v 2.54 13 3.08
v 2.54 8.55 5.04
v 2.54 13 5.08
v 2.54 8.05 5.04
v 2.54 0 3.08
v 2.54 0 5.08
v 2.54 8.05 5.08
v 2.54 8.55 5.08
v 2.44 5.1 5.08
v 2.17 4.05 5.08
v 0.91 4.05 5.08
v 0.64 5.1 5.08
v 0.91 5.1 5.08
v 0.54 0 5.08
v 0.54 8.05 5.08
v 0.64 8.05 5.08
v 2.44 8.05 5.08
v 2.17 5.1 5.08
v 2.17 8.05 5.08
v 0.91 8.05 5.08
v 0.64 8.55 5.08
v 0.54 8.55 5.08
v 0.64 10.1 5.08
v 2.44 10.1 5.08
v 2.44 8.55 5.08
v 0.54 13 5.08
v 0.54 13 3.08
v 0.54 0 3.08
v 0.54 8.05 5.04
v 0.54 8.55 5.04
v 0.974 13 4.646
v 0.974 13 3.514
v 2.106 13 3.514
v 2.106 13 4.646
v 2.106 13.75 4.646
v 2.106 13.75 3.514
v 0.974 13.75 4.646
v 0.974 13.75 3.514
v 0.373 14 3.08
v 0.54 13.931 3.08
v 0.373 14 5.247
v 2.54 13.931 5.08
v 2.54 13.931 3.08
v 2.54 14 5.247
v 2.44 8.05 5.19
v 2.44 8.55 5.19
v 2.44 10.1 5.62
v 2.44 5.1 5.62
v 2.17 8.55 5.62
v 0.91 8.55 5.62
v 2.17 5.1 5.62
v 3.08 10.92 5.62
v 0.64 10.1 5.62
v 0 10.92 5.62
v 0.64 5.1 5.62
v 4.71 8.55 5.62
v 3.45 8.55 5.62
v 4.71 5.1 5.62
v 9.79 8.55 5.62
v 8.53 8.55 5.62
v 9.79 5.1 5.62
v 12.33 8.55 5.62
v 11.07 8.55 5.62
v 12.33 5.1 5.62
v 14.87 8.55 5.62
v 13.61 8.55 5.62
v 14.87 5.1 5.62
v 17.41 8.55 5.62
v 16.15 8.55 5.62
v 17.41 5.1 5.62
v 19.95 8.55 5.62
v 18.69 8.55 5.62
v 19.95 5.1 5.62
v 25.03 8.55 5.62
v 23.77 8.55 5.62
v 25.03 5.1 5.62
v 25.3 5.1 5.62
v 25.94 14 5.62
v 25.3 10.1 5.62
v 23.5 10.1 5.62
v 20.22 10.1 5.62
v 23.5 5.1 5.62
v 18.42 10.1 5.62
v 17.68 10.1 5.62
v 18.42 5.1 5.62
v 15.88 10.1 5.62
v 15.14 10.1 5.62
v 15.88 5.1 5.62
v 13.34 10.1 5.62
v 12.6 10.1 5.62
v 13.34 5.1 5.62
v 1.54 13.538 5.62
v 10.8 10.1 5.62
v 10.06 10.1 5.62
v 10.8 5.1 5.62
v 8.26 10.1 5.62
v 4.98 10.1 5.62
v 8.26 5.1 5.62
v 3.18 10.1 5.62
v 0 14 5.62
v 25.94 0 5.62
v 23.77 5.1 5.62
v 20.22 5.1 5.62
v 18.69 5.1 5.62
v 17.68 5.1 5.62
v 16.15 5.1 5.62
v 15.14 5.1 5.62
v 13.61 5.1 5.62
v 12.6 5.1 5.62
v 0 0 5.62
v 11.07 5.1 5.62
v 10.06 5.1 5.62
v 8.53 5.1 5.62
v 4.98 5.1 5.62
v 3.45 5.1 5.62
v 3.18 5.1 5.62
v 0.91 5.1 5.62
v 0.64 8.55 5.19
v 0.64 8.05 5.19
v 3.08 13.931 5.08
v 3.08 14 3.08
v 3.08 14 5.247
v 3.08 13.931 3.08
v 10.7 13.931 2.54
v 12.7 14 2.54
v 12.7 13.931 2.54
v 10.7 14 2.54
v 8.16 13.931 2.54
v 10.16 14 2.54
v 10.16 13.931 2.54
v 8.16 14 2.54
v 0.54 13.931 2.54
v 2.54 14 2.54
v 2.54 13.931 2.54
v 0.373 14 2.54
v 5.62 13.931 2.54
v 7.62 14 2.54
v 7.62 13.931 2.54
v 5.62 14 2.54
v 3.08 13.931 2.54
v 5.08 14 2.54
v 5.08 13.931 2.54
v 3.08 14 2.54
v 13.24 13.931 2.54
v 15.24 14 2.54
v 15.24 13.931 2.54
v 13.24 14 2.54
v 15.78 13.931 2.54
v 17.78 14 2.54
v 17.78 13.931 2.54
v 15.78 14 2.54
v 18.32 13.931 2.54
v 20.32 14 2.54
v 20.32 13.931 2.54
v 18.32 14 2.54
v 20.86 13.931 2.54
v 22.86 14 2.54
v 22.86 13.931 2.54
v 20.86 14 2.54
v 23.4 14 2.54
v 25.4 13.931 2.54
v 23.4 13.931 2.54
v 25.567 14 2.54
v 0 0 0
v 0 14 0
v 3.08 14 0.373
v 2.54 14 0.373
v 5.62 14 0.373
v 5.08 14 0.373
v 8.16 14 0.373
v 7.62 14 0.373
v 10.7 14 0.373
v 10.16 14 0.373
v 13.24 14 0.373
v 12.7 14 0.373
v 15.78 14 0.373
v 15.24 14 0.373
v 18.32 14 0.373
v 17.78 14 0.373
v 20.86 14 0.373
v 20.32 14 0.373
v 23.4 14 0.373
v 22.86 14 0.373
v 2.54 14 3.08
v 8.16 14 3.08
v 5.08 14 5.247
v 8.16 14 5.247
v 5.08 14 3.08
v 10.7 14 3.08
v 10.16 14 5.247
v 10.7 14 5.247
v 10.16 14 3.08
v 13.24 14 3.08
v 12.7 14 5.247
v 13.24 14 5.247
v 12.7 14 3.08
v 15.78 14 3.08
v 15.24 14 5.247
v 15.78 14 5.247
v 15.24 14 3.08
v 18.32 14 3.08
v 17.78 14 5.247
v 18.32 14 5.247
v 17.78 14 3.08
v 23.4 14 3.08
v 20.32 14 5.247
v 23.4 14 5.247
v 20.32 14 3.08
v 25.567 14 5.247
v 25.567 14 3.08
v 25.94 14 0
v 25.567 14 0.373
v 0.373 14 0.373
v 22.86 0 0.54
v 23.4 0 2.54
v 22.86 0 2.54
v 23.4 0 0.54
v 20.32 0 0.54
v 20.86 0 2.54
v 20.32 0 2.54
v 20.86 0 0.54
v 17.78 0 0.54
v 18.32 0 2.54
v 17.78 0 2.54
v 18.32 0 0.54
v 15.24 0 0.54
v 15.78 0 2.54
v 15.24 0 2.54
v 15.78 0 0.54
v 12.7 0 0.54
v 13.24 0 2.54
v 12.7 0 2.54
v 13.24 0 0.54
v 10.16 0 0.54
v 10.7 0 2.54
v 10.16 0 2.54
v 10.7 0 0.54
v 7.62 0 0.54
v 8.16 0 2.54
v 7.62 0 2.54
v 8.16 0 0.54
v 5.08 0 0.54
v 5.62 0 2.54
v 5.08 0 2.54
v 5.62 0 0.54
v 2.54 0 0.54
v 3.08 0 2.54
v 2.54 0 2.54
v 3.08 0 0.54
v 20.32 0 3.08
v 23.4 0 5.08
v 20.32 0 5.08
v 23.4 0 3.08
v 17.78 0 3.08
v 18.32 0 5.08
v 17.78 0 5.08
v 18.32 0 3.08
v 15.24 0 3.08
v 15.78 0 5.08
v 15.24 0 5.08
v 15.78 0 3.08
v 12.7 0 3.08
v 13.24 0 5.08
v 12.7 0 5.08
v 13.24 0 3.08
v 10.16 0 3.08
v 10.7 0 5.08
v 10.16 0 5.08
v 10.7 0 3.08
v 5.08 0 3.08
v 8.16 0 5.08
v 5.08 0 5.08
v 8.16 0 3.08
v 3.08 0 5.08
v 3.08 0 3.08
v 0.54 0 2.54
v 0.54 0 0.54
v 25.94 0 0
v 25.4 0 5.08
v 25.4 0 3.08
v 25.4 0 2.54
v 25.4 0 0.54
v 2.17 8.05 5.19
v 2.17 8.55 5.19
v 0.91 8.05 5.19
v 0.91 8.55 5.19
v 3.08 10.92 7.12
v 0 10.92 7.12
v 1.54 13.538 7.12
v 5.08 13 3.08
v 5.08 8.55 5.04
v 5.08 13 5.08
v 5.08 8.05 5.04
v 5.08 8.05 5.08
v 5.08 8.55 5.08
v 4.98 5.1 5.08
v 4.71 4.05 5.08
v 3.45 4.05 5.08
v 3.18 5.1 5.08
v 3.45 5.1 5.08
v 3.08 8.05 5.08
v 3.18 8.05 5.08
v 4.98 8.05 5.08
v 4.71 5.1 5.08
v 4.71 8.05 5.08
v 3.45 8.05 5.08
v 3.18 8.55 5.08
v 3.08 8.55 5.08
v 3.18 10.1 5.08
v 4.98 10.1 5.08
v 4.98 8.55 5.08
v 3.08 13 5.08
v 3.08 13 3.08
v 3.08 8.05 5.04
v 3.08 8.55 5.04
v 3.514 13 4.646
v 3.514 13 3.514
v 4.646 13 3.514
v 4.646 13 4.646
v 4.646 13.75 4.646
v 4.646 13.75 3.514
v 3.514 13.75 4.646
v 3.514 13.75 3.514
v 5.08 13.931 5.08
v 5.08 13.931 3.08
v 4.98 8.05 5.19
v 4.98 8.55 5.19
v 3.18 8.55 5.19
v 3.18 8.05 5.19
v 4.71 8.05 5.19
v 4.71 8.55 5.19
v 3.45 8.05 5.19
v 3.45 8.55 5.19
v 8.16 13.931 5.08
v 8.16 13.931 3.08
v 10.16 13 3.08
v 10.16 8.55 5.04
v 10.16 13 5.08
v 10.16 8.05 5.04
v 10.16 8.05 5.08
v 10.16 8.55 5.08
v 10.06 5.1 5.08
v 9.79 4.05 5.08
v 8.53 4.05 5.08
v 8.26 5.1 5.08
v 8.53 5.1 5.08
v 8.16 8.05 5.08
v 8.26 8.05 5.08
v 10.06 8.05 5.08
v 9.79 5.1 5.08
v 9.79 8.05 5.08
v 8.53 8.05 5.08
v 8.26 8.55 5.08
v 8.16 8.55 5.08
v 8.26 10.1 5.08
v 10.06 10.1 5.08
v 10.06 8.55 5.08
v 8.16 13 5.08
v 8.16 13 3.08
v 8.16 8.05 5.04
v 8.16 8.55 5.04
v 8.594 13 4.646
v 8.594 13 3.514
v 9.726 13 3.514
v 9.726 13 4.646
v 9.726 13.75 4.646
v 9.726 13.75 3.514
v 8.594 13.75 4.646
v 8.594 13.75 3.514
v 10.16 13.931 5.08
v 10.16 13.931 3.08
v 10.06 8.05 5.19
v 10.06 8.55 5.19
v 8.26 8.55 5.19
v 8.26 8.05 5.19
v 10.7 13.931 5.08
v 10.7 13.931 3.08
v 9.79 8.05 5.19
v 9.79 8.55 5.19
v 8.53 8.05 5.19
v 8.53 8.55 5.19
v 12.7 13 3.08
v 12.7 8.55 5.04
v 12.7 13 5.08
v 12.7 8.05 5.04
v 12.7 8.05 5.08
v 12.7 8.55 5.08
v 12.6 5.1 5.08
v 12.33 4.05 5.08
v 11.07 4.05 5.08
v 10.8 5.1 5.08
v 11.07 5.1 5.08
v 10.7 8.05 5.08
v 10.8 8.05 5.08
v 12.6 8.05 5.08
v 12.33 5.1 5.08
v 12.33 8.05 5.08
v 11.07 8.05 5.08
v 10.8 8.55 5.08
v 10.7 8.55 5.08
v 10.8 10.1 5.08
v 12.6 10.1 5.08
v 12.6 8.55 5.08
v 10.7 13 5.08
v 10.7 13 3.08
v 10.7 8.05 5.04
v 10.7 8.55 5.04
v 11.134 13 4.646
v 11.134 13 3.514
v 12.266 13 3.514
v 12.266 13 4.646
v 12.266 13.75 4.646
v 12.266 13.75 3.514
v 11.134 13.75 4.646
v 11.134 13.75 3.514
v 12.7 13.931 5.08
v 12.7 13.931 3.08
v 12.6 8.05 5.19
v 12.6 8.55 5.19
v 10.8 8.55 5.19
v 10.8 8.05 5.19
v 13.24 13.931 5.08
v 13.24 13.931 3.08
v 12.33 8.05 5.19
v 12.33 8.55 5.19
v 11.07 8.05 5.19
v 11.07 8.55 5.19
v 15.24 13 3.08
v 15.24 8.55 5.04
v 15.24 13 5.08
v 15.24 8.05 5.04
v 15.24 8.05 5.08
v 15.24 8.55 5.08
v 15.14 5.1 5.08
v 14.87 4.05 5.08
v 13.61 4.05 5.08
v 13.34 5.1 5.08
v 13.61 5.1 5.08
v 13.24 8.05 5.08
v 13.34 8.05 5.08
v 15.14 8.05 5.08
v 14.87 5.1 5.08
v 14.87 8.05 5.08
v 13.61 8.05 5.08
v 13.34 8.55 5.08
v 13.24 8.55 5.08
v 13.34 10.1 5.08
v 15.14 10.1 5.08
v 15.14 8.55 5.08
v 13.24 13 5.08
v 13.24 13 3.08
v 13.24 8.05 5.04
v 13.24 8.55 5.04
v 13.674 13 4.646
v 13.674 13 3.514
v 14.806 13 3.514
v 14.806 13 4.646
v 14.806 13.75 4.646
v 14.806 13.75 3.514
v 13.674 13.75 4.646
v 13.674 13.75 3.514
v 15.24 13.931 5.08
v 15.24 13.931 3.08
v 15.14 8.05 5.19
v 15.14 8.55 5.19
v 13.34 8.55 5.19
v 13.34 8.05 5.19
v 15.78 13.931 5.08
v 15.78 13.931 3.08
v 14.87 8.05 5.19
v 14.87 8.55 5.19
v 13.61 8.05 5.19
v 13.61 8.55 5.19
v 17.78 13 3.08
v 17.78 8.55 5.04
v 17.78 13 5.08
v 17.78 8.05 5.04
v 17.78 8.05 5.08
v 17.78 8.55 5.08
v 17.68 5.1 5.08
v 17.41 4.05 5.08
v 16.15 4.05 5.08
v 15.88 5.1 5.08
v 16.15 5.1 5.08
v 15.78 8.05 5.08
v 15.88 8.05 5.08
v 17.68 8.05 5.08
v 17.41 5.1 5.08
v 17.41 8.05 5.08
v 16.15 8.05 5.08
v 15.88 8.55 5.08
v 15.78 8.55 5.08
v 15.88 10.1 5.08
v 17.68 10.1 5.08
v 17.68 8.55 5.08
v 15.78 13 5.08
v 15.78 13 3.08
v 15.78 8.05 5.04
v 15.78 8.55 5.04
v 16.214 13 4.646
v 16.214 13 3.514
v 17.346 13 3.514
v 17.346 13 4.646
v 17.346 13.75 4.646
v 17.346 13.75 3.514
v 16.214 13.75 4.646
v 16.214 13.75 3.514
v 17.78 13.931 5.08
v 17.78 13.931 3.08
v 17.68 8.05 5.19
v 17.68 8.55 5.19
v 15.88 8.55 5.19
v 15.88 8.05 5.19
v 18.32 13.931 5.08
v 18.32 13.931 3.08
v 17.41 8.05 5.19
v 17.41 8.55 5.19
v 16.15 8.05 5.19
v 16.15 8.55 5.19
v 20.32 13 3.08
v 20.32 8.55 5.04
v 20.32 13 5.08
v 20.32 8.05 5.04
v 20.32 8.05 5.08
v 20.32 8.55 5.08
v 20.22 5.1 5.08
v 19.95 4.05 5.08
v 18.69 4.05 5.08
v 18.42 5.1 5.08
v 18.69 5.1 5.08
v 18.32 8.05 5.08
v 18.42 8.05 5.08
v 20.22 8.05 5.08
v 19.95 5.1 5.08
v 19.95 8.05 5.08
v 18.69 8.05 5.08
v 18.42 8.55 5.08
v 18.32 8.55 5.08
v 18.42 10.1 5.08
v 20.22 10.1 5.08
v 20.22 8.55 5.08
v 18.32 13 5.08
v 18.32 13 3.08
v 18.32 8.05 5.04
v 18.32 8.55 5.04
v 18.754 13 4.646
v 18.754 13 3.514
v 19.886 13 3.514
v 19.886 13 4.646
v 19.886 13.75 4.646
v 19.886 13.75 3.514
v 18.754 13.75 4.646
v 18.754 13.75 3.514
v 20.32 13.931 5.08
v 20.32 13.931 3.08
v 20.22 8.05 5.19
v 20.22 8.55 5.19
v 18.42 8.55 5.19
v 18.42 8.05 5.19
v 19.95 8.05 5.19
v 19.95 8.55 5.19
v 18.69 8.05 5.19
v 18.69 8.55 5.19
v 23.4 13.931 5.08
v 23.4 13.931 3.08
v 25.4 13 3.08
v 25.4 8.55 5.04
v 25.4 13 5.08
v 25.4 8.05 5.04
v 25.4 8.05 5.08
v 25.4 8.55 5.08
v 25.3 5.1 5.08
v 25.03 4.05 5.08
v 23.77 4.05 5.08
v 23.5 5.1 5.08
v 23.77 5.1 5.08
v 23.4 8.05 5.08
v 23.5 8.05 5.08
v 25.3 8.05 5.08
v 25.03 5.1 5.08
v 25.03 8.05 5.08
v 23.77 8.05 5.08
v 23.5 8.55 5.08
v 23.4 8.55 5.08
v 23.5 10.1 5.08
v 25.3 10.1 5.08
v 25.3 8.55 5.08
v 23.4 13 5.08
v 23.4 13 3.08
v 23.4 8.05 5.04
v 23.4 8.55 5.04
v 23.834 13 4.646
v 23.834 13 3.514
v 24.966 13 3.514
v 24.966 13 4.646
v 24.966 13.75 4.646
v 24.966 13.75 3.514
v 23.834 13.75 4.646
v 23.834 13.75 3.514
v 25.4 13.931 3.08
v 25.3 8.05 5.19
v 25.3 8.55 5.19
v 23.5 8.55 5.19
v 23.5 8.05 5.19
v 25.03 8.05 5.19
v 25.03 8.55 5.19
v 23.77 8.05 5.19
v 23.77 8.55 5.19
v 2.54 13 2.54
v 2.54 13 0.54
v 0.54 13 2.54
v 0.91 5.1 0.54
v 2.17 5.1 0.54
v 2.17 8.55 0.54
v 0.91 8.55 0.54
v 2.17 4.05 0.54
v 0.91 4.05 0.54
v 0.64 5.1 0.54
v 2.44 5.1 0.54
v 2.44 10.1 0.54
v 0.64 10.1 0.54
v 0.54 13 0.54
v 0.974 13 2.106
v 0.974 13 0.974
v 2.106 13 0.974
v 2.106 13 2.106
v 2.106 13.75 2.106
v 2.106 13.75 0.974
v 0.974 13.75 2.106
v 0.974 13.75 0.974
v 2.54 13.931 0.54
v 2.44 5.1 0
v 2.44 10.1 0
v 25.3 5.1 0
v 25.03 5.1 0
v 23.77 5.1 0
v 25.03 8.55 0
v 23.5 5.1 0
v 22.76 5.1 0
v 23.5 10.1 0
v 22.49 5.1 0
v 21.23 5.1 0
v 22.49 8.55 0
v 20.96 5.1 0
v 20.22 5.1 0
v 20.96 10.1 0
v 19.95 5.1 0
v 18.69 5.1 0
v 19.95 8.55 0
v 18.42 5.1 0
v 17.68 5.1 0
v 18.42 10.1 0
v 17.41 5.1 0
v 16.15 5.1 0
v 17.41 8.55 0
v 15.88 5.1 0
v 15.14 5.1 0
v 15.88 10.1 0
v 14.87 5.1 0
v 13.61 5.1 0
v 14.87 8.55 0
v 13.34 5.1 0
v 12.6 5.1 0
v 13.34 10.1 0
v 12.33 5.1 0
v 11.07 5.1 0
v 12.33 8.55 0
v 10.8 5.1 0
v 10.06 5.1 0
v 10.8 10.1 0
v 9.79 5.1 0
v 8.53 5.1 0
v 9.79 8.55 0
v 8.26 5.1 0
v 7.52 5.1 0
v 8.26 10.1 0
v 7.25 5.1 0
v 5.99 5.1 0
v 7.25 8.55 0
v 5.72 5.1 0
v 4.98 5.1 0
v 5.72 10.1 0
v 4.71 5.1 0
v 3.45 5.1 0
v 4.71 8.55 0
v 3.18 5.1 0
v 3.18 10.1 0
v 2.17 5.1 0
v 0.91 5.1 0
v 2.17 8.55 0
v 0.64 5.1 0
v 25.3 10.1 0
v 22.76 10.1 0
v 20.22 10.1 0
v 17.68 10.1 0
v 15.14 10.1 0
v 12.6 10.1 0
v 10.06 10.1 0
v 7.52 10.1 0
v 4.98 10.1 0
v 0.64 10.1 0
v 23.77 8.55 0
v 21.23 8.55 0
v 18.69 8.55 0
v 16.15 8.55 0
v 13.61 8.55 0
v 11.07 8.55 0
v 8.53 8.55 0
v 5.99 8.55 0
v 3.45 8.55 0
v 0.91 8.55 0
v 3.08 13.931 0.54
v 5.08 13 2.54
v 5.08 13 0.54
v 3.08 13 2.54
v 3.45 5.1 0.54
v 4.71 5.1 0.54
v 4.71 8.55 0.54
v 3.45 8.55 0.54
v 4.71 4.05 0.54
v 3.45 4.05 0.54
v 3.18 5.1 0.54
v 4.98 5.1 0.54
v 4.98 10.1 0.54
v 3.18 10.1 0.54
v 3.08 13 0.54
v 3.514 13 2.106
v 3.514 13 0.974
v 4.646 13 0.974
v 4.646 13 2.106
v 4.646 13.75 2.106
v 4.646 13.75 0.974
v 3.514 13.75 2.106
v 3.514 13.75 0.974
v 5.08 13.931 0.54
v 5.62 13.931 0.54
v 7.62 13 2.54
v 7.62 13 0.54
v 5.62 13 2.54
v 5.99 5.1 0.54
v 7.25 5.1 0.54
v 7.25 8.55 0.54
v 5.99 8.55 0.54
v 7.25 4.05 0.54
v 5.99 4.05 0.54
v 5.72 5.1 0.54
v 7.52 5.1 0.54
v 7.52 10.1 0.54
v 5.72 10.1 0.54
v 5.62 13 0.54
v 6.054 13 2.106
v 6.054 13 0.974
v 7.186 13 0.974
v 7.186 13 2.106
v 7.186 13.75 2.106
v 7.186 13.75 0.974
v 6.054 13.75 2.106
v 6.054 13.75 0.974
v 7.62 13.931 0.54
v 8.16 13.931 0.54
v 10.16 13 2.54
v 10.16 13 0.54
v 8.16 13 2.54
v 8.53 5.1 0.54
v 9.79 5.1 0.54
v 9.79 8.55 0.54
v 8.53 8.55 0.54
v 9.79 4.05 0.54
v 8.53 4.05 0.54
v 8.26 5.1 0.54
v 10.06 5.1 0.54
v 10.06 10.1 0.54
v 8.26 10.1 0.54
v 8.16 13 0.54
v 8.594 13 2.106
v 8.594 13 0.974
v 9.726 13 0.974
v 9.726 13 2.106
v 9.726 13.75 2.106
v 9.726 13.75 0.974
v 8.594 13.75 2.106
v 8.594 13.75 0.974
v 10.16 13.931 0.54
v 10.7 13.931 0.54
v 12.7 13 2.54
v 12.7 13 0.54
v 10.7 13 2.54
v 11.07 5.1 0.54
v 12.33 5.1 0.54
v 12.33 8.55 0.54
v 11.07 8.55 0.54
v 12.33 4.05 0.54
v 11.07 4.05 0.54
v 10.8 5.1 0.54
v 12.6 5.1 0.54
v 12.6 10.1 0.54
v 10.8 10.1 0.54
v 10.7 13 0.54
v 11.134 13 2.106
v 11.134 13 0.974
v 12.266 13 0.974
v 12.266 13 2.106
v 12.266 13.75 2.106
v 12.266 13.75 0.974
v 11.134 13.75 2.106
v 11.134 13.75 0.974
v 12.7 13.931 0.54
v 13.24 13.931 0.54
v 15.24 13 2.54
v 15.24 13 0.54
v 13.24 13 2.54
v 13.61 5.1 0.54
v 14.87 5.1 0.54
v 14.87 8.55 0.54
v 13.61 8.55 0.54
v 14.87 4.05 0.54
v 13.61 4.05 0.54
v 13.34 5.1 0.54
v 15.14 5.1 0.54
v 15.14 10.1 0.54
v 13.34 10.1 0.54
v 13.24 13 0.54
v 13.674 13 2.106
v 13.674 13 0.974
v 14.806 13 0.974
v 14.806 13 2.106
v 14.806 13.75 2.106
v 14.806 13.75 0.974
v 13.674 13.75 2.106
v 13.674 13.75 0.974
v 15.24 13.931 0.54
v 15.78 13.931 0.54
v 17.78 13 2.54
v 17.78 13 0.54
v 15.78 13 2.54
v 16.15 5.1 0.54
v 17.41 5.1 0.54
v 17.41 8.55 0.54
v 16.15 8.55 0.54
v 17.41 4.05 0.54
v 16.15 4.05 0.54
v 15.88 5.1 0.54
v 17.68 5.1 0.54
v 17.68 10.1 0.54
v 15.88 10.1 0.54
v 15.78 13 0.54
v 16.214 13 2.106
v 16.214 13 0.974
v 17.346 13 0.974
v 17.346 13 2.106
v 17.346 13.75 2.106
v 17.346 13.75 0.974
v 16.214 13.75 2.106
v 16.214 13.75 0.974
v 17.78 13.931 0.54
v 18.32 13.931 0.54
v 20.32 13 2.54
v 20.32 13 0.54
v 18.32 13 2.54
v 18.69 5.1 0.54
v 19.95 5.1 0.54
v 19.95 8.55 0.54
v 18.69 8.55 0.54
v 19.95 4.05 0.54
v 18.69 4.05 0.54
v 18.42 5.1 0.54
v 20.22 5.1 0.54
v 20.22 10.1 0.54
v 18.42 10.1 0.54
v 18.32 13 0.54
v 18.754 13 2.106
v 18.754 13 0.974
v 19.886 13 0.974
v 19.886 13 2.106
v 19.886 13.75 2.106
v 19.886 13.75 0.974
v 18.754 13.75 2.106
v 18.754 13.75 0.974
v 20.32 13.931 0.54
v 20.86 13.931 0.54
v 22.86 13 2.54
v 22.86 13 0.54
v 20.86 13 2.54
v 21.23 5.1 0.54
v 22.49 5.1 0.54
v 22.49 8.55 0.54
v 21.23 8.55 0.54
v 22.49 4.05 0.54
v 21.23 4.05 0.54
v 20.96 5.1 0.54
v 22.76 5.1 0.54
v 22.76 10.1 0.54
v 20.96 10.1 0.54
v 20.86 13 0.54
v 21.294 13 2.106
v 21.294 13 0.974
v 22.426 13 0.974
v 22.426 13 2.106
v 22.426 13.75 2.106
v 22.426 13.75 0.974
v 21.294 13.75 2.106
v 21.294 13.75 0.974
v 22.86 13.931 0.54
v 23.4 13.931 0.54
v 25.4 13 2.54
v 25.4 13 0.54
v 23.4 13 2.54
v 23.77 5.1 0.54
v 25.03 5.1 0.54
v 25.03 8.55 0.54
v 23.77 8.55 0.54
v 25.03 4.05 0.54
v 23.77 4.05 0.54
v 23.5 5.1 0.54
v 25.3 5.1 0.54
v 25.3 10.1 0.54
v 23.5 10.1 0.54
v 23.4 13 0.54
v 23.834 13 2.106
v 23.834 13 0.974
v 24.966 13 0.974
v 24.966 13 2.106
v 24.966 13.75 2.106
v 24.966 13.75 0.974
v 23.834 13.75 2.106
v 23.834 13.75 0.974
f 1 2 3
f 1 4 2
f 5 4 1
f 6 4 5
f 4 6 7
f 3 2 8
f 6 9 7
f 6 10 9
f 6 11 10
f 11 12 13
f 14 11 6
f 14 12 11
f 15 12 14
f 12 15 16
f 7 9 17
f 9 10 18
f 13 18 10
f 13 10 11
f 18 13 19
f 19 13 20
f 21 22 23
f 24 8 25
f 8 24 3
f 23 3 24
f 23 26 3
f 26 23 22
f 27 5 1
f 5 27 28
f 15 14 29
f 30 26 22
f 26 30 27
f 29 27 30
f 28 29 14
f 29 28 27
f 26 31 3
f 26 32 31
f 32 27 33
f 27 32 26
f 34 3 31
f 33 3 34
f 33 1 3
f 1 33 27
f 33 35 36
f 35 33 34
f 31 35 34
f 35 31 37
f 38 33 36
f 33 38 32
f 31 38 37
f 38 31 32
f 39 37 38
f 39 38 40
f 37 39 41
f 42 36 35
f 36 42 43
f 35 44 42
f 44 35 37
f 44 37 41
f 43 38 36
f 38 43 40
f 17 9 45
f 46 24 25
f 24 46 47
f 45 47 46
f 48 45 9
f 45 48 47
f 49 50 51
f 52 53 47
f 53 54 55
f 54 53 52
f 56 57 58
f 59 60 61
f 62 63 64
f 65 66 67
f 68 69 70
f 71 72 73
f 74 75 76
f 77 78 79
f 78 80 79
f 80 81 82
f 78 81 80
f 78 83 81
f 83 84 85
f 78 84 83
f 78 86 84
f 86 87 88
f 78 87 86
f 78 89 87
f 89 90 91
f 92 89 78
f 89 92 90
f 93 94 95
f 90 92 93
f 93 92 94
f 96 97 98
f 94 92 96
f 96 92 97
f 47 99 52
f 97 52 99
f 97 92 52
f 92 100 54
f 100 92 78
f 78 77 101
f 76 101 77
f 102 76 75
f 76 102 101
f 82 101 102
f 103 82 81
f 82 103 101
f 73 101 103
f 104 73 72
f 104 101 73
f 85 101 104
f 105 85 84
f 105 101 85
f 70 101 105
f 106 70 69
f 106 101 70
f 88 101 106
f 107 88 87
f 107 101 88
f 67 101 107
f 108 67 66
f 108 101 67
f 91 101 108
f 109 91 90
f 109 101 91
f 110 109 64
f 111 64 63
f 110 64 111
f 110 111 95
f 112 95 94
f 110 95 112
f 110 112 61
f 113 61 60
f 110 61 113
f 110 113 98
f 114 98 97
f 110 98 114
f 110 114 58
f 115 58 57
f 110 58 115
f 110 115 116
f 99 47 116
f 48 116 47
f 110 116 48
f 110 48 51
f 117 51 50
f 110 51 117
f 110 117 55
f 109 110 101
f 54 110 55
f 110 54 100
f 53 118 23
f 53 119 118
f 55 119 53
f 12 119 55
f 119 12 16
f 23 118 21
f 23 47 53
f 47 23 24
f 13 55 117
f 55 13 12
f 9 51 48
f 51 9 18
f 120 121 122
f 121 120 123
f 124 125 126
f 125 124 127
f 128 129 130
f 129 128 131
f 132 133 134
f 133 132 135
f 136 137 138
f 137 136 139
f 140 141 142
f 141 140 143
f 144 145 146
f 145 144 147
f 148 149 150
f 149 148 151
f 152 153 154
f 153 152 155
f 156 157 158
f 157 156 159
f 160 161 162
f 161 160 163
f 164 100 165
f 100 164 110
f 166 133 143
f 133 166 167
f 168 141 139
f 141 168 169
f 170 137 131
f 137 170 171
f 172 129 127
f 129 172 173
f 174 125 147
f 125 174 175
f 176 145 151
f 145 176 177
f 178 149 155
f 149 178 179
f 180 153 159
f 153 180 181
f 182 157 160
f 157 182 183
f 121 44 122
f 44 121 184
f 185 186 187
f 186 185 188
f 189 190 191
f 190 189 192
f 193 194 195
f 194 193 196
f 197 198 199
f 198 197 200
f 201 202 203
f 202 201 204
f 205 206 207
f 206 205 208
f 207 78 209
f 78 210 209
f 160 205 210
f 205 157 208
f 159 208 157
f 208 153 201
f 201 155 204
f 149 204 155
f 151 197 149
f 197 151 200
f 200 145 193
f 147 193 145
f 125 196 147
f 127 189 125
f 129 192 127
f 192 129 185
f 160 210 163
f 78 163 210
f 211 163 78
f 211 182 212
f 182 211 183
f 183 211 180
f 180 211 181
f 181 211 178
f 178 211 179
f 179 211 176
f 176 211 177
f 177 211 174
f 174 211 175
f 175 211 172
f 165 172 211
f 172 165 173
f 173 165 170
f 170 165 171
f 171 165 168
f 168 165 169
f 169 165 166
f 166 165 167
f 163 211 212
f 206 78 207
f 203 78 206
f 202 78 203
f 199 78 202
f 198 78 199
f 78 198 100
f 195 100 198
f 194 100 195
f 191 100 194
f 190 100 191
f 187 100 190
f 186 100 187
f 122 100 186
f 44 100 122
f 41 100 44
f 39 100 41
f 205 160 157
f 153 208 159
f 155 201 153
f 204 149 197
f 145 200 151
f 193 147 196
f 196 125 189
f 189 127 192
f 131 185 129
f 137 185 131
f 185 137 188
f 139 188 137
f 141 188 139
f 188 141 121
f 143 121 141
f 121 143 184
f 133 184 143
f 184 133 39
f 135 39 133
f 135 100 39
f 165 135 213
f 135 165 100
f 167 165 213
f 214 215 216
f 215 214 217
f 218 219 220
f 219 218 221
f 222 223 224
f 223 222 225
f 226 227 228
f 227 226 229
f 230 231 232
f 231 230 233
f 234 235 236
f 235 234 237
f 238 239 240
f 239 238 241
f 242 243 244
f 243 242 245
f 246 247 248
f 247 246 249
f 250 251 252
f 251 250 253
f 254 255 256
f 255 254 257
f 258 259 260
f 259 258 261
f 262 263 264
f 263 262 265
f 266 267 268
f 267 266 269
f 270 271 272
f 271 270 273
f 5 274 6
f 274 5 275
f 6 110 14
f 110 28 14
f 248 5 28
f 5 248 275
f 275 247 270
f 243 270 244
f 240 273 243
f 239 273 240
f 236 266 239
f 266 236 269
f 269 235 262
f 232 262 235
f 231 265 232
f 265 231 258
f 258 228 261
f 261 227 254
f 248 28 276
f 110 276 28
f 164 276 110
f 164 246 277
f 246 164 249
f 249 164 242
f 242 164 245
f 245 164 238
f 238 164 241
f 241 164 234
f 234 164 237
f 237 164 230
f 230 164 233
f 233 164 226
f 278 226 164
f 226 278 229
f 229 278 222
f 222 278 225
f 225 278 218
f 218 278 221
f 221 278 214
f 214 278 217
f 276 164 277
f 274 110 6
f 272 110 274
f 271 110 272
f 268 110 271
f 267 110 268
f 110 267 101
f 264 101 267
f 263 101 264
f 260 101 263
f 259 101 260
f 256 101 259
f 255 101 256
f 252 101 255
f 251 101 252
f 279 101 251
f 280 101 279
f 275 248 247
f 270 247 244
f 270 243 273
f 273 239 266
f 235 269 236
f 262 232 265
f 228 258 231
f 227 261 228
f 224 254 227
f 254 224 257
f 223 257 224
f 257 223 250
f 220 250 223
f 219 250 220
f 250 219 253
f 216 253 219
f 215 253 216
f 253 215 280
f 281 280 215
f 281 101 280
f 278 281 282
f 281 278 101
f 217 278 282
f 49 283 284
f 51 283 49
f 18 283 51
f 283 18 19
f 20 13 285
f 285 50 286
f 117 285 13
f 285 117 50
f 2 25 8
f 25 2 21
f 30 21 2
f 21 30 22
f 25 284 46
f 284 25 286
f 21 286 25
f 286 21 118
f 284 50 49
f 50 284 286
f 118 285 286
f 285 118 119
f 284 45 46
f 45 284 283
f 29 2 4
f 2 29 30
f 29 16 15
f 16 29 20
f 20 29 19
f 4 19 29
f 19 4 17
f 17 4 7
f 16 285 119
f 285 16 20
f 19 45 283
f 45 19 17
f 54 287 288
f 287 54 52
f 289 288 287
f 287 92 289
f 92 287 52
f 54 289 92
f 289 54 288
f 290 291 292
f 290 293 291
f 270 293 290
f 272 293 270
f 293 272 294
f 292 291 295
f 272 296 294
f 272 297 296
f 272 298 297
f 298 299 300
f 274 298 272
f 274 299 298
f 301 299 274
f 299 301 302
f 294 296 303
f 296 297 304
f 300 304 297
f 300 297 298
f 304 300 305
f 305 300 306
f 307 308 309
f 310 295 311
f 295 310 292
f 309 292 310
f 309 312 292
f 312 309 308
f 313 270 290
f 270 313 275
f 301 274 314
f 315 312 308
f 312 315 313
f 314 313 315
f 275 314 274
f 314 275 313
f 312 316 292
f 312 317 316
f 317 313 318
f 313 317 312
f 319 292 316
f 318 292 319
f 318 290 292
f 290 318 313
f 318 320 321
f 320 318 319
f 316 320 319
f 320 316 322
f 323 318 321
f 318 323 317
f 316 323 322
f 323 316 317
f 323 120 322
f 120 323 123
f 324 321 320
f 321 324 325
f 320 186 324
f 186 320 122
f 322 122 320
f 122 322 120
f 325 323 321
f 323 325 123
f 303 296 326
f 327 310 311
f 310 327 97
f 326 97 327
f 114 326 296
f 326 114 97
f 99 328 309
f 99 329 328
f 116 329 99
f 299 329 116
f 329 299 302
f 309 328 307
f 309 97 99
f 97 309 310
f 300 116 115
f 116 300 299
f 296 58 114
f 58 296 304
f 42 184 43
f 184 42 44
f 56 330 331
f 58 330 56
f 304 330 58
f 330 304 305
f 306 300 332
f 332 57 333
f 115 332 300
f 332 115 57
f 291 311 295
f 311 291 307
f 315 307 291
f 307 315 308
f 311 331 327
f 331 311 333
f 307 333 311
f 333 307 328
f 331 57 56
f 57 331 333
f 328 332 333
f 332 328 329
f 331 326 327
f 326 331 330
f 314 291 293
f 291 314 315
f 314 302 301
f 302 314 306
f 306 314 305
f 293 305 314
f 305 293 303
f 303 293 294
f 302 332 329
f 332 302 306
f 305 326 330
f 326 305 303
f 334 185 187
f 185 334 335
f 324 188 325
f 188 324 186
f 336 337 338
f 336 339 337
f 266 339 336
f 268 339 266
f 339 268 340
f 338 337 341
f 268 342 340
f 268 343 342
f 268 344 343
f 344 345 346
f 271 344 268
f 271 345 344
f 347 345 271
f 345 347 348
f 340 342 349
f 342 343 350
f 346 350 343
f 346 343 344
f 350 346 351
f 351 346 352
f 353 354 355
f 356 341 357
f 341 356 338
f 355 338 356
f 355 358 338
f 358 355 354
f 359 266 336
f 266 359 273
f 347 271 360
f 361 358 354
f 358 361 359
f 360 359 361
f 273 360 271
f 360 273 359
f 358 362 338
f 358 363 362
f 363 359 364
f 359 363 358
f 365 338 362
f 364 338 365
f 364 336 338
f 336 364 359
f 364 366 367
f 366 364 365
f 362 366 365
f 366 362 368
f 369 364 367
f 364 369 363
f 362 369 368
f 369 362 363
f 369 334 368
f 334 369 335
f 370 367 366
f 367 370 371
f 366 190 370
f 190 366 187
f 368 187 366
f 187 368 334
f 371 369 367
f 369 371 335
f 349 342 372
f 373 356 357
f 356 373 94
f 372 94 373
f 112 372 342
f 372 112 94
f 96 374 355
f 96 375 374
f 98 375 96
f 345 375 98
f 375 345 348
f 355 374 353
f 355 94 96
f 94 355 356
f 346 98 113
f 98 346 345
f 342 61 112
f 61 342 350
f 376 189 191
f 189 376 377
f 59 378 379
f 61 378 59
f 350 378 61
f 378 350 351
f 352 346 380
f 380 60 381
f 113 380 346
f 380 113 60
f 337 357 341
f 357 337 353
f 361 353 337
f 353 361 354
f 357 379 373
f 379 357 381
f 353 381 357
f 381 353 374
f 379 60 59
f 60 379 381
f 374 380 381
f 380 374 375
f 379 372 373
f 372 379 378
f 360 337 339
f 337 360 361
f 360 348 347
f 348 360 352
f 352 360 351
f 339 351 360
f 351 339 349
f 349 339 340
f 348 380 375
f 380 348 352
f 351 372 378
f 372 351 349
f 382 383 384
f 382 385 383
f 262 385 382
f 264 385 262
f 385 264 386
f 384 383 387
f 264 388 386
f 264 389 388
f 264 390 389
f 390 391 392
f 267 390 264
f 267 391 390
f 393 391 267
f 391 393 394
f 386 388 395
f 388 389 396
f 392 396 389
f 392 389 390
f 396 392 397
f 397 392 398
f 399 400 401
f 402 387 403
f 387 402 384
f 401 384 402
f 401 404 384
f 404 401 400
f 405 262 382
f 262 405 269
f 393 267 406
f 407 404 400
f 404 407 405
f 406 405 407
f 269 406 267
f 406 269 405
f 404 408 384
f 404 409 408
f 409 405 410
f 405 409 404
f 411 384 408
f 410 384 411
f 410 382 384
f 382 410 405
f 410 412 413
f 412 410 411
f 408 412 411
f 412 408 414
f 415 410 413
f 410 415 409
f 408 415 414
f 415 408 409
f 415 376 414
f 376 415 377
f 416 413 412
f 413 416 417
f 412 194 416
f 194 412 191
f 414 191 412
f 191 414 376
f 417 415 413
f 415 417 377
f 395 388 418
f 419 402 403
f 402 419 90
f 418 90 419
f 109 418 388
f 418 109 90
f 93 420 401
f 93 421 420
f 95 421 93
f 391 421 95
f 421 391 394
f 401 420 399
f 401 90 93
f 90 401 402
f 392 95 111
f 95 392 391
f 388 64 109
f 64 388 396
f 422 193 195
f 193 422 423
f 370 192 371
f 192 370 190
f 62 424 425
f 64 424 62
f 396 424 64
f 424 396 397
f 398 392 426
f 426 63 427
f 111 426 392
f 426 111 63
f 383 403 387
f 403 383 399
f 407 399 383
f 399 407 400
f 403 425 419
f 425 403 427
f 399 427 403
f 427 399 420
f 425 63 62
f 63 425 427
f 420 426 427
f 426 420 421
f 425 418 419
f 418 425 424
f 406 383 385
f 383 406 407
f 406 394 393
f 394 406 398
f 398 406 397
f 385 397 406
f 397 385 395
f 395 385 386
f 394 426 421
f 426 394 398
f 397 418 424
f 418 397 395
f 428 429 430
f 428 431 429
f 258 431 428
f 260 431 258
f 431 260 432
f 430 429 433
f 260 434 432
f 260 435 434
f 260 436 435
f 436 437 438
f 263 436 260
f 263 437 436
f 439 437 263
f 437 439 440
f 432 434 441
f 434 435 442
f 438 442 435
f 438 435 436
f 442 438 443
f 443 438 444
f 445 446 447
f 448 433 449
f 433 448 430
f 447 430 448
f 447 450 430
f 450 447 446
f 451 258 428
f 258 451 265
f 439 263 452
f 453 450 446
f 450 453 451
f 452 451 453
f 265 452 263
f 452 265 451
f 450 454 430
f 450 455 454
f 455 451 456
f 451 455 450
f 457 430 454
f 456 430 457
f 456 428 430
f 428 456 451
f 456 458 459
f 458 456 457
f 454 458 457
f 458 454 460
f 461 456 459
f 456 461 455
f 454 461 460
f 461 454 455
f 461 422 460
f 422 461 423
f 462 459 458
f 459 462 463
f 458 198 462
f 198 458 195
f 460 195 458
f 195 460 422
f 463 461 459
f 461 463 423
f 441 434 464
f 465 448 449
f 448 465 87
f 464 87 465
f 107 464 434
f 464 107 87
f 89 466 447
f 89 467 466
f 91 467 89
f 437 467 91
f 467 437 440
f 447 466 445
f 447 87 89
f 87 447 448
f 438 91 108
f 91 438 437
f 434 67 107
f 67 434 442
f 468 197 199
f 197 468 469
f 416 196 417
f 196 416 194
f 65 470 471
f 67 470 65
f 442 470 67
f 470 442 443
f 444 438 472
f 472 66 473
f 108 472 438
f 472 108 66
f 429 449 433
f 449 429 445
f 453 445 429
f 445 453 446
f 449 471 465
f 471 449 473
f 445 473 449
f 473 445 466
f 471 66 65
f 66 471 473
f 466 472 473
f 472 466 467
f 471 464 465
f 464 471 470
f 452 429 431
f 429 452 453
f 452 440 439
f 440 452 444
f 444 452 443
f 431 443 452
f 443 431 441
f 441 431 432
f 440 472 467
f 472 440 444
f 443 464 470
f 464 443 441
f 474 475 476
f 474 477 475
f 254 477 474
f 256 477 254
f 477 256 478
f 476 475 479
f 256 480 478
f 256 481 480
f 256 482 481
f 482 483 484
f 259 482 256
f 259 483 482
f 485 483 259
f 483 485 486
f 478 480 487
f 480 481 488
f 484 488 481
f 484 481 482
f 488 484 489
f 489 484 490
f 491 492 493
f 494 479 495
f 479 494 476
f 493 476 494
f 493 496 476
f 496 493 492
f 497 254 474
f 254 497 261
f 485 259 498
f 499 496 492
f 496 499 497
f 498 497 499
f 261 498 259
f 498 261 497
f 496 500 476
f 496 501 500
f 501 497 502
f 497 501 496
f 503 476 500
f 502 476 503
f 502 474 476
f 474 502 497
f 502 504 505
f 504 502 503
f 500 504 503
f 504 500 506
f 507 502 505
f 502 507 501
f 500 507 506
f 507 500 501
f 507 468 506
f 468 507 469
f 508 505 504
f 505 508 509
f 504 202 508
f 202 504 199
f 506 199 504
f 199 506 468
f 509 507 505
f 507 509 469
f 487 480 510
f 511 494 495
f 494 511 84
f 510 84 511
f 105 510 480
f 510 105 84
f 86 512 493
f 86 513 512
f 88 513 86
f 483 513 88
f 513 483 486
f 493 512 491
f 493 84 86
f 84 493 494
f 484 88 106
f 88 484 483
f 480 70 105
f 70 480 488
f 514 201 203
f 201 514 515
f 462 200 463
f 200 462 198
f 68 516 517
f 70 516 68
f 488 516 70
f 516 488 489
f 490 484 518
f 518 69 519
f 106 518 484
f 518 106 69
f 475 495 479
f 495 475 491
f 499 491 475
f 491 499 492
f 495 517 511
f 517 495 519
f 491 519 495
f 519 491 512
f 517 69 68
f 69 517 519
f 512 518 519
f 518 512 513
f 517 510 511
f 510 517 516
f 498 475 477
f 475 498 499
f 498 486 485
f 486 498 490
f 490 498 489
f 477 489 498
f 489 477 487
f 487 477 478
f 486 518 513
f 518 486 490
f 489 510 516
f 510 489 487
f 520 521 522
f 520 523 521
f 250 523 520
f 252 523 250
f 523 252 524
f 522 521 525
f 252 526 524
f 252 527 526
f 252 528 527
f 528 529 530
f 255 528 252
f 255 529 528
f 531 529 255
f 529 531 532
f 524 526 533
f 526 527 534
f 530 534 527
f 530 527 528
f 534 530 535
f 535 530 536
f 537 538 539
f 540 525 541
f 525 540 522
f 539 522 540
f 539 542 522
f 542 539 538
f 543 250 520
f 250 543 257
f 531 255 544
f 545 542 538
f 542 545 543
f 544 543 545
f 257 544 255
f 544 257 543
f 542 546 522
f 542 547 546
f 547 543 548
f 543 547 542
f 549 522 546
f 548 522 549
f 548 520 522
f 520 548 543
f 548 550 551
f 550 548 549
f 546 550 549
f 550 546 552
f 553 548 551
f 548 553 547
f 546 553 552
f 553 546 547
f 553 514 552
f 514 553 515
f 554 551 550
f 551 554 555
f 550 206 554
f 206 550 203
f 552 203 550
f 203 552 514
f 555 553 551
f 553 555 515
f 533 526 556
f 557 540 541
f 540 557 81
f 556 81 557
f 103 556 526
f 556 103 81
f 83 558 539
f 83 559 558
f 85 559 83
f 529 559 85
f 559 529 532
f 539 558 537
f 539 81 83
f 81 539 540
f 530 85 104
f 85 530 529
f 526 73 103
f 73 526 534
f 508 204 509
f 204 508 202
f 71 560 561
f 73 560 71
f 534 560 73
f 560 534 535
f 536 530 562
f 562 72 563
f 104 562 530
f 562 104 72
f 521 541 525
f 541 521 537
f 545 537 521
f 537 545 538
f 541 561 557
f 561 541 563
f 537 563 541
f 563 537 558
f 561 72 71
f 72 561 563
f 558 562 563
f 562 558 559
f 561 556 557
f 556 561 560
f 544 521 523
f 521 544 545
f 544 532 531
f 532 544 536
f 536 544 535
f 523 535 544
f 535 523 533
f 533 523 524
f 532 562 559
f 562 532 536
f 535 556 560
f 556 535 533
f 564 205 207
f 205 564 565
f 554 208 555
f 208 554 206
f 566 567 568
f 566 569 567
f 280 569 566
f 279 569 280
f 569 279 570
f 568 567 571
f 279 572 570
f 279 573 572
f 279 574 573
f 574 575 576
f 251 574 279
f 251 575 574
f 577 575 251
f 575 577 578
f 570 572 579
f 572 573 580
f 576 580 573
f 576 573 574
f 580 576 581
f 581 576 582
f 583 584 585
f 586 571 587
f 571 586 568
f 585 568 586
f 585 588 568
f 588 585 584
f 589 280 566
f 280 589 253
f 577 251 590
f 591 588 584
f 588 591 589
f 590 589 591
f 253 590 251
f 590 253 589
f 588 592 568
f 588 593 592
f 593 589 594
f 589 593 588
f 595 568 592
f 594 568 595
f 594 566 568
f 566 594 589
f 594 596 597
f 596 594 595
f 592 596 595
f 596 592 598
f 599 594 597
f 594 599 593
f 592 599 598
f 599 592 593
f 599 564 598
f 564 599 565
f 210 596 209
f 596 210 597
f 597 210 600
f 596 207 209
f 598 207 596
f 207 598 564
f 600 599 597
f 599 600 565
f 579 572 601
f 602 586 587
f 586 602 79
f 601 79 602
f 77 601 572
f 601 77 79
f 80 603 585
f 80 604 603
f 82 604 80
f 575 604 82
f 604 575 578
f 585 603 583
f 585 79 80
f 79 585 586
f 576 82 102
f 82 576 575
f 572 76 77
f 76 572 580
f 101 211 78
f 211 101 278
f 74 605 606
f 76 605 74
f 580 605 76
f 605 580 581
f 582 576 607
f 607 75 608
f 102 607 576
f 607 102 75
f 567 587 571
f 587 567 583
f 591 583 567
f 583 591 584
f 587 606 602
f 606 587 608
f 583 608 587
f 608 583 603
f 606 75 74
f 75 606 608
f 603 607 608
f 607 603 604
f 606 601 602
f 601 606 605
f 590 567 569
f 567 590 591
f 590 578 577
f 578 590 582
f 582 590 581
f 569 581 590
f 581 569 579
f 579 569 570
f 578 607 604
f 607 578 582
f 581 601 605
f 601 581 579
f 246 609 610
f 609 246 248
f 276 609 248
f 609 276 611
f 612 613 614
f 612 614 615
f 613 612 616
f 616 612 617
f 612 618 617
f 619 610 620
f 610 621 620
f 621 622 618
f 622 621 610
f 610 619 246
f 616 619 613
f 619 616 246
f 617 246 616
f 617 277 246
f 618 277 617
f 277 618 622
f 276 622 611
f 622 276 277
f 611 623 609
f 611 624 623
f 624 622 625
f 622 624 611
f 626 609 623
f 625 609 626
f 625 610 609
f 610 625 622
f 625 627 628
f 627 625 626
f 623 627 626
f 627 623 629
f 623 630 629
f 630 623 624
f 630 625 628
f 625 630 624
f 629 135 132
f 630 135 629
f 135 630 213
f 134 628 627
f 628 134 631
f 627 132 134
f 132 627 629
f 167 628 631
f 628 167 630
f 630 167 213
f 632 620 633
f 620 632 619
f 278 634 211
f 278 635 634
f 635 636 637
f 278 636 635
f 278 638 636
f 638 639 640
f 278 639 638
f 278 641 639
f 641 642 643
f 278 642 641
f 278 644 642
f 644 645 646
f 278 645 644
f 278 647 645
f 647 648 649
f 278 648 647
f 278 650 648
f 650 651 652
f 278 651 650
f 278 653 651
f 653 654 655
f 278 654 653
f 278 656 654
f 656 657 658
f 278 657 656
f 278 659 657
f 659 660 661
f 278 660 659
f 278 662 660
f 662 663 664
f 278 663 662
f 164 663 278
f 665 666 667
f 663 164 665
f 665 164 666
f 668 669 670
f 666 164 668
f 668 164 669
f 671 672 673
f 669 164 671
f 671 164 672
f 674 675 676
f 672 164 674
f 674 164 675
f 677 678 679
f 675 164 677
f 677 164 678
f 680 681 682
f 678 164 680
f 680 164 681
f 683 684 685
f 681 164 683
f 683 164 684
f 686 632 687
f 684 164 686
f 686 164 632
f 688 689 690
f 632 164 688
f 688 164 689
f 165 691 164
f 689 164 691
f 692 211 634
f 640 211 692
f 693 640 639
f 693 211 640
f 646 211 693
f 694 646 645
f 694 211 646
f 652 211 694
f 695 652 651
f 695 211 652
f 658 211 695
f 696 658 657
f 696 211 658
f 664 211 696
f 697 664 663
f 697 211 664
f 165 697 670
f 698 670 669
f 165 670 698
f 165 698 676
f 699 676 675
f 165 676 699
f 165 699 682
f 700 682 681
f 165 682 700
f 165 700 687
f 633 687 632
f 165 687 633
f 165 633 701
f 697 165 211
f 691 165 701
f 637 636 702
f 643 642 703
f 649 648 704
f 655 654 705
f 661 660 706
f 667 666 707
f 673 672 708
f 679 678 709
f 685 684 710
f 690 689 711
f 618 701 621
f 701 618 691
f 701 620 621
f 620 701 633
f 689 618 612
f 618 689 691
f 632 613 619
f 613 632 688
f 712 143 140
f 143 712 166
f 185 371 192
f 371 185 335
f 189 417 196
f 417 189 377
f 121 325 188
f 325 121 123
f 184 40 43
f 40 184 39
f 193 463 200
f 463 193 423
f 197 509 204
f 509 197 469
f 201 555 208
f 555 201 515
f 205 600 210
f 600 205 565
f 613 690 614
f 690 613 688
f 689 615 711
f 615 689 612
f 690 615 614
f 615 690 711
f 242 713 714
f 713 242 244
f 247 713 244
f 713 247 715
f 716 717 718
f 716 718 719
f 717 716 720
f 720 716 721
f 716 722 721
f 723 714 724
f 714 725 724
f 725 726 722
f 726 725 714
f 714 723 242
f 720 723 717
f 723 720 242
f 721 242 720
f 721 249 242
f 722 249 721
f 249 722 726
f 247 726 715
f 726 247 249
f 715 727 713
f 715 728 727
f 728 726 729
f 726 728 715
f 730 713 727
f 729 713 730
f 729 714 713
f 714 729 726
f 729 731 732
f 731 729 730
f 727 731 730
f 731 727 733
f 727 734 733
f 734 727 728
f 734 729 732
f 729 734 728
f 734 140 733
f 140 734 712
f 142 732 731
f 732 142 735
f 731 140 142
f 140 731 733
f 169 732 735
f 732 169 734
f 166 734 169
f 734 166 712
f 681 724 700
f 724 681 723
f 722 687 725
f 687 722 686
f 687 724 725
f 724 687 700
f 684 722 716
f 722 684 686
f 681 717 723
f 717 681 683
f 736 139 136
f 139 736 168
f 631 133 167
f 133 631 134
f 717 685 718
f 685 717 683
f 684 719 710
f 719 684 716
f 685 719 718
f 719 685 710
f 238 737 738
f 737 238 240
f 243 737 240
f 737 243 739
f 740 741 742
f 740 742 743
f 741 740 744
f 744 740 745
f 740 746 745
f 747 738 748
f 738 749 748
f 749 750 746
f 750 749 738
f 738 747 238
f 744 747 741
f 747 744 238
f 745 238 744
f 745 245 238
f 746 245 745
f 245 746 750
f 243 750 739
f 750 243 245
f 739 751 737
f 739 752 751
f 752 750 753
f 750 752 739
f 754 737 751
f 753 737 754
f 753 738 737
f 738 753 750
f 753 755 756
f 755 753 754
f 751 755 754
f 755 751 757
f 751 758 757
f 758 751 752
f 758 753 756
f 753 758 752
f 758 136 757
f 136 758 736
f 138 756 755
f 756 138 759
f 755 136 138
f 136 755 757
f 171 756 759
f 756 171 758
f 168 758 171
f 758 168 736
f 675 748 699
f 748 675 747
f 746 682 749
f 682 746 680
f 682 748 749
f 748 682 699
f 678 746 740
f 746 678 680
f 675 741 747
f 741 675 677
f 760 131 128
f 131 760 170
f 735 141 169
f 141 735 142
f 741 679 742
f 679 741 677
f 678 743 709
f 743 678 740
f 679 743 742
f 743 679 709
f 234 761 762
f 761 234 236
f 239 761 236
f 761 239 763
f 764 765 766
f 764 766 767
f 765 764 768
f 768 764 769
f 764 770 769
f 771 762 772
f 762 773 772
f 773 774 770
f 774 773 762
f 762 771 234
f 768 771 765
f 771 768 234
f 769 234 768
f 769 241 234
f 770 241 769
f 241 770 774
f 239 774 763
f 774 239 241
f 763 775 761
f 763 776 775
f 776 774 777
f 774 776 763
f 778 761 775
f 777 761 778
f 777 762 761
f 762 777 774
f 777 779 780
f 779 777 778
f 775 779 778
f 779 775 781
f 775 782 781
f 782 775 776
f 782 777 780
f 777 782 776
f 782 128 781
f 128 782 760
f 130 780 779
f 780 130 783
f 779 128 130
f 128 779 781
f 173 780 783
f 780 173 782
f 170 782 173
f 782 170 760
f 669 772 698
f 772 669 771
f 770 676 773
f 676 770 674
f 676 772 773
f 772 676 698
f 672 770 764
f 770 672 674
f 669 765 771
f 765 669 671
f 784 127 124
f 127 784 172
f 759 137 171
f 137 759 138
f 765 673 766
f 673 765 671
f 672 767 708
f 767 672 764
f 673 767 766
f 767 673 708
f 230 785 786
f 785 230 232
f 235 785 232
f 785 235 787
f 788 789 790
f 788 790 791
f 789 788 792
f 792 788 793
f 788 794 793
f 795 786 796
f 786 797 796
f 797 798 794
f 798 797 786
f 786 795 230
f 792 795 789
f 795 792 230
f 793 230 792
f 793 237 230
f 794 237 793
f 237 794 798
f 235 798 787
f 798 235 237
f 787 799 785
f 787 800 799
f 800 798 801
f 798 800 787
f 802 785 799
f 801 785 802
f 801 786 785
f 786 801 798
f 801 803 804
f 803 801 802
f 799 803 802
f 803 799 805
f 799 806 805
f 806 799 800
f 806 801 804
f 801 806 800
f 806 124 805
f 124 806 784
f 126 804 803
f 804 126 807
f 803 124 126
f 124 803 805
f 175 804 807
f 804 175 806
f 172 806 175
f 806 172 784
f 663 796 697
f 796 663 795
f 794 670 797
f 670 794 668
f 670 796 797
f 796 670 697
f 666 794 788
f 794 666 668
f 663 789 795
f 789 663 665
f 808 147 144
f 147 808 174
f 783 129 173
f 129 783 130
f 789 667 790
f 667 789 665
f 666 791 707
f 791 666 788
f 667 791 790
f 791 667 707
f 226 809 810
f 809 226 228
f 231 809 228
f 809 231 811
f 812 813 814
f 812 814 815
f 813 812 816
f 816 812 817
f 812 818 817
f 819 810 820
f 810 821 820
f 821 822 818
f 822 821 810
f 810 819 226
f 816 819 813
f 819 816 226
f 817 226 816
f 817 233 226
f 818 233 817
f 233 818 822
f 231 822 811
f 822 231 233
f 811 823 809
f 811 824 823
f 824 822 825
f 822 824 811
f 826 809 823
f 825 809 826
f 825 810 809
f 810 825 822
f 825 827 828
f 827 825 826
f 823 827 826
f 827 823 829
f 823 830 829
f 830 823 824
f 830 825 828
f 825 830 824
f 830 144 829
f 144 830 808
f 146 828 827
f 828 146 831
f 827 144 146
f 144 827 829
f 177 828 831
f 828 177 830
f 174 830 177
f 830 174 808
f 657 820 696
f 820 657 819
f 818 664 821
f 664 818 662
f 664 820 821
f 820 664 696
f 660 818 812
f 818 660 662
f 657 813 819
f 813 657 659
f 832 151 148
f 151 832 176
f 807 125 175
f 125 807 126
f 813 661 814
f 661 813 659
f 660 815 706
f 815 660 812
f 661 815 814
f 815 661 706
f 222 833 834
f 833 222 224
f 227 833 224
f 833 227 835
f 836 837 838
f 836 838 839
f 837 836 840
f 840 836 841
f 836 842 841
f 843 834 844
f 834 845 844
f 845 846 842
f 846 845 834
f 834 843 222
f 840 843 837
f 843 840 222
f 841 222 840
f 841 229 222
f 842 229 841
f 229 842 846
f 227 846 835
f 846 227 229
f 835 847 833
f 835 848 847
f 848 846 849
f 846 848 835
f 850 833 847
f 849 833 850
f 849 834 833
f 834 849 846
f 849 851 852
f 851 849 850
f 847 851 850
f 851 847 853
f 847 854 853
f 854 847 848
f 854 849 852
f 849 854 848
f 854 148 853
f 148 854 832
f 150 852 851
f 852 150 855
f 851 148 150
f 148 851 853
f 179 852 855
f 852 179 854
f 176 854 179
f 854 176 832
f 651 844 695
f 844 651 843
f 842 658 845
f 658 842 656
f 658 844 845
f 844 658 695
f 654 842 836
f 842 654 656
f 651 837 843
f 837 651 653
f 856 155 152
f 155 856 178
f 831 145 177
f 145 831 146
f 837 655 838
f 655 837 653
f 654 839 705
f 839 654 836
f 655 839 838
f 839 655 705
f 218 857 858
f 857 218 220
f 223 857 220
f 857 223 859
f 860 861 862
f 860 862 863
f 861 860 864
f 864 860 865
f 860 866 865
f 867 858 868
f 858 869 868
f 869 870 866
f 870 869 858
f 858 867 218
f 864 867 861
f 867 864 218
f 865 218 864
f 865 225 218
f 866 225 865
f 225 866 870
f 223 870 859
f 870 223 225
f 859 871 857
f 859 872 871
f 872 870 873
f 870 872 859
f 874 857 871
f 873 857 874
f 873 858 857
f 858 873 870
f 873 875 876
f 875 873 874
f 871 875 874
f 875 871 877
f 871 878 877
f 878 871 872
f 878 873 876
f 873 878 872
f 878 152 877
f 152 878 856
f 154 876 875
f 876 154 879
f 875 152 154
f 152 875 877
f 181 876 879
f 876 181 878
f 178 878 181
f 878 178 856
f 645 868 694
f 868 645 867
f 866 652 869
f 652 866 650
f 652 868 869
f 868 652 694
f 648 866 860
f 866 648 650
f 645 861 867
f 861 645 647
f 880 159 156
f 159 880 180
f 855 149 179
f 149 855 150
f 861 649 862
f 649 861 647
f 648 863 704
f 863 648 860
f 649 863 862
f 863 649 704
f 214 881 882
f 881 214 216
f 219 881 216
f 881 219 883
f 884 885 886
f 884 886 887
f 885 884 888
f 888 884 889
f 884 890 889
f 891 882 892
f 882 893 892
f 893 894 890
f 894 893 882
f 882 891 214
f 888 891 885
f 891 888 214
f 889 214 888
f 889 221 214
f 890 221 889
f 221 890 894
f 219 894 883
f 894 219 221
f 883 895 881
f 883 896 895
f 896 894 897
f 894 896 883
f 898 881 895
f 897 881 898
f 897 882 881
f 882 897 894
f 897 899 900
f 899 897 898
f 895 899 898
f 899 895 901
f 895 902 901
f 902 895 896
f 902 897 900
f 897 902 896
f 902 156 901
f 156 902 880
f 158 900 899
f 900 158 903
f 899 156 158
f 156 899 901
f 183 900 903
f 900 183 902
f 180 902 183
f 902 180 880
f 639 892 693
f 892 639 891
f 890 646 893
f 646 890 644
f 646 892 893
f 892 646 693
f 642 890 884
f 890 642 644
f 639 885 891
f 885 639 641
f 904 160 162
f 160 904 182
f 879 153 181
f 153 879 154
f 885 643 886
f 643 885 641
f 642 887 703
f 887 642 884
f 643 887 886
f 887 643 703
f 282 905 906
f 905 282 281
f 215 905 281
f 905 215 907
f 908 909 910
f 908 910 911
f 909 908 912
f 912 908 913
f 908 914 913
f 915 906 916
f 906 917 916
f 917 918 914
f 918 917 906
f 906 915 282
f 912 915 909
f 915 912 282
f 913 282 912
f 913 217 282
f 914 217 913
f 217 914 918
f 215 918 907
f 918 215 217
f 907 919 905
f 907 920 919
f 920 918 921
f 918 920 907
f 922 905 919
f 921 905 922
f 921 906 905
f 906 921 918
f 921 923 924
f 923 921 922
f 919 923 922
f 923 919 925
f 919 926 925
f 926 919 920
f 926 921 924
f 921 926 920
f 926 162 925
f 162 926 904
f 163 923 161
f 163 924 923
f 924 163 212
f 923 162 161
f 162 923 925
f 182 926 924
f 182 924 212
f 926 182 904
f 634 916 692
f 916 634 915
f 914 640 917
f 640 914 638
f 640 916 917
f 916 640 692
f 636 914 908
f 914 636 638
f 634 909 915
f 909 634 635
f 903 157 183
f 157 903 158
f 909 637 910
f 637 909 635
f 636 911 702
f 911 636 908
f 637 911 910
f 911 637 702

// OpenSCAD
// remixed the model from Jaap_aap
//
// connector pins are numbered this way
// row 1:   1 - 2 - 3 - 4 - 5 .... n
// row 2:   n+1 - n+2, n+3 .... 2n
// change the 4 settings below to customize your connector]

//number of connector rows
rows = 2;  // [1, 2]
pins = 10;  // number of pins per row
show_pin1 = true; // show the triangle indicator for pin 1
triangle_height = 1.5;
pin1_triangle = show_pin1?triangle_height:0;
keys = [3,9]; // slots to be filled solid for keying the connector

spacing = 2.54; // pin to pin spacing 2.54mm
wall = 0.54;    // shell wall thickness
length = 14;  // connector length
function cavity(s,w) = s-w; // shell cavity to hold the connector pin;

// each pin shell will consist of the cavity and a wall on each side
// the walls on adjacent shells will overlap
function shell(c,w) = c+(2*w);

// for inverting offset values between row 1 and 2
pos_neg = [1,1,-1];

module triangle(p1_triangle_height,sh){
  linear_extrude(p1_triangle_height)
    polygon(points = [[-sh/2,0],[0,sh*0.85],[sh/2,0]], paths = [[0,1,2,0]]);
}

module add_shell(pin, row, filled_position, p1_triangle_height, sp, w, l, c, sh) {
    tab_cavity_length = 5;
    tab_length = 4.5;
    tab_hole_pos = (l - tab_cavity_length)/2 -3.9;// 3.9mm from the end
    tab_pos = tab_hole_pos - tab_cavity_length -0.8 + tab_length; 
    translate([sh/2, l/2, sh/2])
    union(){
        difference(){
            // draw the basic block
            translate([0,0,0])cube([sh,l,sh], center = true);

            if (filled_position != true){
                // hollow out space for the pin body, but leave an end
                // in place to prevent the pin from going all the way through
                translate([0,-1,0])cube([c,l,c],center = true);

                // put a smaller hole in the opposite end for receiving the mating pin
                // make a square rod for the hole using the cylinder command with
                // only 4 facets for the perimeter surface
                rotate([90, 45, 0])
                cylinder(r = 0.4*c, h = l+6, center = true, $fn = 4);

                // now chamfer that end
                translate([0, l/2, 0])rotate([90, 45, 0])
                cylinder(r1 = 1.25*c, r2 = 0.4*c, h = c/4,
                         center = true, $fn = 4);

                // make the hole for the tab
                translate([0, tab_hole_pos, pos_neg[row]*(c+w)/2])
                cube([0.9*c, tab_cavity_length, w], center = true);
                
            }
        }
        // add the tab
        translate([0, tab_pos,
                   pos_neg[row]*(c+w)/2])
        cube([0.9*c - w, tab_length, w], center = true);
        
        // if the top row, make a break-away support for the tab
        if (row == 1){
            
            translate([0, tab_pos+2,
                       pos_neg[row]*((c+w/2)/2-0.1)])
            cube([c, 0.5, 0.15], center = true);
        }    
        
        // if pin 1 add the triangle indicator
        if (pin==1 && row==1 && p1_triangle_height>0){
            translate([0,l/2-sh, c/2+w])
            triangle(p1_triangle_height,sh);
         }
    }
}

module tests(r,p,k,p1_t){
  assert((r==1 || r==2), "rows must be 1 or 2");
  assert(p>=1, "pins must be >=1");
  assert(is_list(k), "keys must be a list");
  assert(p1_t >=0, "triangle_height must be >= 0");
  
}
module dupont_connector(r,p,k,p1_t=1.5,sp=2.54,w=0.54,l=14){
  tests(r,p,k,p1_t);
  c = cavity(sp, w); // cavity
  sh = shell(c,w); // shell
  for(j = [1:r]) {
      for(i = [1:p]) {
          translate([(i - 1) * sp,0,(r - j) * sp])
          render() add_shell(i, j, search(i + (j - 1) * p, k)==[]?false:true,p1_t, sp, w, l, c, sh);
      }
  }
}

function dupont_connector_size(r,p,k,p1_t=1.5,sp=2.54,w=0.54,l=14) = [
  (((sp-w)+(2*w))*p)-w*(p-1),
  l,
  (((sp-w)+(2*w))*r)-w*(r-1)];

module dupont_connector_solid(r,p,k,p1_t=1,sp=2.54,w=0.54,l=14){
  tests(r,p,k,p1_t);
  shell_size = dupont_connector_size(r,p,k,p1_t,sp,w,l);
  c = cavity(sp, w);
  sh = shell(c,w);
  union(){
    cube(shell_size);
    if(p1_t >=0)
      translate([0,0,shell_size[2]])
        translate([sh/2,l-sh, 0])
        triangle(p1_t, sh);
  }
}

dupont_connector(rows,pins,keys,pin1_triangle,spacing,wall,length);
